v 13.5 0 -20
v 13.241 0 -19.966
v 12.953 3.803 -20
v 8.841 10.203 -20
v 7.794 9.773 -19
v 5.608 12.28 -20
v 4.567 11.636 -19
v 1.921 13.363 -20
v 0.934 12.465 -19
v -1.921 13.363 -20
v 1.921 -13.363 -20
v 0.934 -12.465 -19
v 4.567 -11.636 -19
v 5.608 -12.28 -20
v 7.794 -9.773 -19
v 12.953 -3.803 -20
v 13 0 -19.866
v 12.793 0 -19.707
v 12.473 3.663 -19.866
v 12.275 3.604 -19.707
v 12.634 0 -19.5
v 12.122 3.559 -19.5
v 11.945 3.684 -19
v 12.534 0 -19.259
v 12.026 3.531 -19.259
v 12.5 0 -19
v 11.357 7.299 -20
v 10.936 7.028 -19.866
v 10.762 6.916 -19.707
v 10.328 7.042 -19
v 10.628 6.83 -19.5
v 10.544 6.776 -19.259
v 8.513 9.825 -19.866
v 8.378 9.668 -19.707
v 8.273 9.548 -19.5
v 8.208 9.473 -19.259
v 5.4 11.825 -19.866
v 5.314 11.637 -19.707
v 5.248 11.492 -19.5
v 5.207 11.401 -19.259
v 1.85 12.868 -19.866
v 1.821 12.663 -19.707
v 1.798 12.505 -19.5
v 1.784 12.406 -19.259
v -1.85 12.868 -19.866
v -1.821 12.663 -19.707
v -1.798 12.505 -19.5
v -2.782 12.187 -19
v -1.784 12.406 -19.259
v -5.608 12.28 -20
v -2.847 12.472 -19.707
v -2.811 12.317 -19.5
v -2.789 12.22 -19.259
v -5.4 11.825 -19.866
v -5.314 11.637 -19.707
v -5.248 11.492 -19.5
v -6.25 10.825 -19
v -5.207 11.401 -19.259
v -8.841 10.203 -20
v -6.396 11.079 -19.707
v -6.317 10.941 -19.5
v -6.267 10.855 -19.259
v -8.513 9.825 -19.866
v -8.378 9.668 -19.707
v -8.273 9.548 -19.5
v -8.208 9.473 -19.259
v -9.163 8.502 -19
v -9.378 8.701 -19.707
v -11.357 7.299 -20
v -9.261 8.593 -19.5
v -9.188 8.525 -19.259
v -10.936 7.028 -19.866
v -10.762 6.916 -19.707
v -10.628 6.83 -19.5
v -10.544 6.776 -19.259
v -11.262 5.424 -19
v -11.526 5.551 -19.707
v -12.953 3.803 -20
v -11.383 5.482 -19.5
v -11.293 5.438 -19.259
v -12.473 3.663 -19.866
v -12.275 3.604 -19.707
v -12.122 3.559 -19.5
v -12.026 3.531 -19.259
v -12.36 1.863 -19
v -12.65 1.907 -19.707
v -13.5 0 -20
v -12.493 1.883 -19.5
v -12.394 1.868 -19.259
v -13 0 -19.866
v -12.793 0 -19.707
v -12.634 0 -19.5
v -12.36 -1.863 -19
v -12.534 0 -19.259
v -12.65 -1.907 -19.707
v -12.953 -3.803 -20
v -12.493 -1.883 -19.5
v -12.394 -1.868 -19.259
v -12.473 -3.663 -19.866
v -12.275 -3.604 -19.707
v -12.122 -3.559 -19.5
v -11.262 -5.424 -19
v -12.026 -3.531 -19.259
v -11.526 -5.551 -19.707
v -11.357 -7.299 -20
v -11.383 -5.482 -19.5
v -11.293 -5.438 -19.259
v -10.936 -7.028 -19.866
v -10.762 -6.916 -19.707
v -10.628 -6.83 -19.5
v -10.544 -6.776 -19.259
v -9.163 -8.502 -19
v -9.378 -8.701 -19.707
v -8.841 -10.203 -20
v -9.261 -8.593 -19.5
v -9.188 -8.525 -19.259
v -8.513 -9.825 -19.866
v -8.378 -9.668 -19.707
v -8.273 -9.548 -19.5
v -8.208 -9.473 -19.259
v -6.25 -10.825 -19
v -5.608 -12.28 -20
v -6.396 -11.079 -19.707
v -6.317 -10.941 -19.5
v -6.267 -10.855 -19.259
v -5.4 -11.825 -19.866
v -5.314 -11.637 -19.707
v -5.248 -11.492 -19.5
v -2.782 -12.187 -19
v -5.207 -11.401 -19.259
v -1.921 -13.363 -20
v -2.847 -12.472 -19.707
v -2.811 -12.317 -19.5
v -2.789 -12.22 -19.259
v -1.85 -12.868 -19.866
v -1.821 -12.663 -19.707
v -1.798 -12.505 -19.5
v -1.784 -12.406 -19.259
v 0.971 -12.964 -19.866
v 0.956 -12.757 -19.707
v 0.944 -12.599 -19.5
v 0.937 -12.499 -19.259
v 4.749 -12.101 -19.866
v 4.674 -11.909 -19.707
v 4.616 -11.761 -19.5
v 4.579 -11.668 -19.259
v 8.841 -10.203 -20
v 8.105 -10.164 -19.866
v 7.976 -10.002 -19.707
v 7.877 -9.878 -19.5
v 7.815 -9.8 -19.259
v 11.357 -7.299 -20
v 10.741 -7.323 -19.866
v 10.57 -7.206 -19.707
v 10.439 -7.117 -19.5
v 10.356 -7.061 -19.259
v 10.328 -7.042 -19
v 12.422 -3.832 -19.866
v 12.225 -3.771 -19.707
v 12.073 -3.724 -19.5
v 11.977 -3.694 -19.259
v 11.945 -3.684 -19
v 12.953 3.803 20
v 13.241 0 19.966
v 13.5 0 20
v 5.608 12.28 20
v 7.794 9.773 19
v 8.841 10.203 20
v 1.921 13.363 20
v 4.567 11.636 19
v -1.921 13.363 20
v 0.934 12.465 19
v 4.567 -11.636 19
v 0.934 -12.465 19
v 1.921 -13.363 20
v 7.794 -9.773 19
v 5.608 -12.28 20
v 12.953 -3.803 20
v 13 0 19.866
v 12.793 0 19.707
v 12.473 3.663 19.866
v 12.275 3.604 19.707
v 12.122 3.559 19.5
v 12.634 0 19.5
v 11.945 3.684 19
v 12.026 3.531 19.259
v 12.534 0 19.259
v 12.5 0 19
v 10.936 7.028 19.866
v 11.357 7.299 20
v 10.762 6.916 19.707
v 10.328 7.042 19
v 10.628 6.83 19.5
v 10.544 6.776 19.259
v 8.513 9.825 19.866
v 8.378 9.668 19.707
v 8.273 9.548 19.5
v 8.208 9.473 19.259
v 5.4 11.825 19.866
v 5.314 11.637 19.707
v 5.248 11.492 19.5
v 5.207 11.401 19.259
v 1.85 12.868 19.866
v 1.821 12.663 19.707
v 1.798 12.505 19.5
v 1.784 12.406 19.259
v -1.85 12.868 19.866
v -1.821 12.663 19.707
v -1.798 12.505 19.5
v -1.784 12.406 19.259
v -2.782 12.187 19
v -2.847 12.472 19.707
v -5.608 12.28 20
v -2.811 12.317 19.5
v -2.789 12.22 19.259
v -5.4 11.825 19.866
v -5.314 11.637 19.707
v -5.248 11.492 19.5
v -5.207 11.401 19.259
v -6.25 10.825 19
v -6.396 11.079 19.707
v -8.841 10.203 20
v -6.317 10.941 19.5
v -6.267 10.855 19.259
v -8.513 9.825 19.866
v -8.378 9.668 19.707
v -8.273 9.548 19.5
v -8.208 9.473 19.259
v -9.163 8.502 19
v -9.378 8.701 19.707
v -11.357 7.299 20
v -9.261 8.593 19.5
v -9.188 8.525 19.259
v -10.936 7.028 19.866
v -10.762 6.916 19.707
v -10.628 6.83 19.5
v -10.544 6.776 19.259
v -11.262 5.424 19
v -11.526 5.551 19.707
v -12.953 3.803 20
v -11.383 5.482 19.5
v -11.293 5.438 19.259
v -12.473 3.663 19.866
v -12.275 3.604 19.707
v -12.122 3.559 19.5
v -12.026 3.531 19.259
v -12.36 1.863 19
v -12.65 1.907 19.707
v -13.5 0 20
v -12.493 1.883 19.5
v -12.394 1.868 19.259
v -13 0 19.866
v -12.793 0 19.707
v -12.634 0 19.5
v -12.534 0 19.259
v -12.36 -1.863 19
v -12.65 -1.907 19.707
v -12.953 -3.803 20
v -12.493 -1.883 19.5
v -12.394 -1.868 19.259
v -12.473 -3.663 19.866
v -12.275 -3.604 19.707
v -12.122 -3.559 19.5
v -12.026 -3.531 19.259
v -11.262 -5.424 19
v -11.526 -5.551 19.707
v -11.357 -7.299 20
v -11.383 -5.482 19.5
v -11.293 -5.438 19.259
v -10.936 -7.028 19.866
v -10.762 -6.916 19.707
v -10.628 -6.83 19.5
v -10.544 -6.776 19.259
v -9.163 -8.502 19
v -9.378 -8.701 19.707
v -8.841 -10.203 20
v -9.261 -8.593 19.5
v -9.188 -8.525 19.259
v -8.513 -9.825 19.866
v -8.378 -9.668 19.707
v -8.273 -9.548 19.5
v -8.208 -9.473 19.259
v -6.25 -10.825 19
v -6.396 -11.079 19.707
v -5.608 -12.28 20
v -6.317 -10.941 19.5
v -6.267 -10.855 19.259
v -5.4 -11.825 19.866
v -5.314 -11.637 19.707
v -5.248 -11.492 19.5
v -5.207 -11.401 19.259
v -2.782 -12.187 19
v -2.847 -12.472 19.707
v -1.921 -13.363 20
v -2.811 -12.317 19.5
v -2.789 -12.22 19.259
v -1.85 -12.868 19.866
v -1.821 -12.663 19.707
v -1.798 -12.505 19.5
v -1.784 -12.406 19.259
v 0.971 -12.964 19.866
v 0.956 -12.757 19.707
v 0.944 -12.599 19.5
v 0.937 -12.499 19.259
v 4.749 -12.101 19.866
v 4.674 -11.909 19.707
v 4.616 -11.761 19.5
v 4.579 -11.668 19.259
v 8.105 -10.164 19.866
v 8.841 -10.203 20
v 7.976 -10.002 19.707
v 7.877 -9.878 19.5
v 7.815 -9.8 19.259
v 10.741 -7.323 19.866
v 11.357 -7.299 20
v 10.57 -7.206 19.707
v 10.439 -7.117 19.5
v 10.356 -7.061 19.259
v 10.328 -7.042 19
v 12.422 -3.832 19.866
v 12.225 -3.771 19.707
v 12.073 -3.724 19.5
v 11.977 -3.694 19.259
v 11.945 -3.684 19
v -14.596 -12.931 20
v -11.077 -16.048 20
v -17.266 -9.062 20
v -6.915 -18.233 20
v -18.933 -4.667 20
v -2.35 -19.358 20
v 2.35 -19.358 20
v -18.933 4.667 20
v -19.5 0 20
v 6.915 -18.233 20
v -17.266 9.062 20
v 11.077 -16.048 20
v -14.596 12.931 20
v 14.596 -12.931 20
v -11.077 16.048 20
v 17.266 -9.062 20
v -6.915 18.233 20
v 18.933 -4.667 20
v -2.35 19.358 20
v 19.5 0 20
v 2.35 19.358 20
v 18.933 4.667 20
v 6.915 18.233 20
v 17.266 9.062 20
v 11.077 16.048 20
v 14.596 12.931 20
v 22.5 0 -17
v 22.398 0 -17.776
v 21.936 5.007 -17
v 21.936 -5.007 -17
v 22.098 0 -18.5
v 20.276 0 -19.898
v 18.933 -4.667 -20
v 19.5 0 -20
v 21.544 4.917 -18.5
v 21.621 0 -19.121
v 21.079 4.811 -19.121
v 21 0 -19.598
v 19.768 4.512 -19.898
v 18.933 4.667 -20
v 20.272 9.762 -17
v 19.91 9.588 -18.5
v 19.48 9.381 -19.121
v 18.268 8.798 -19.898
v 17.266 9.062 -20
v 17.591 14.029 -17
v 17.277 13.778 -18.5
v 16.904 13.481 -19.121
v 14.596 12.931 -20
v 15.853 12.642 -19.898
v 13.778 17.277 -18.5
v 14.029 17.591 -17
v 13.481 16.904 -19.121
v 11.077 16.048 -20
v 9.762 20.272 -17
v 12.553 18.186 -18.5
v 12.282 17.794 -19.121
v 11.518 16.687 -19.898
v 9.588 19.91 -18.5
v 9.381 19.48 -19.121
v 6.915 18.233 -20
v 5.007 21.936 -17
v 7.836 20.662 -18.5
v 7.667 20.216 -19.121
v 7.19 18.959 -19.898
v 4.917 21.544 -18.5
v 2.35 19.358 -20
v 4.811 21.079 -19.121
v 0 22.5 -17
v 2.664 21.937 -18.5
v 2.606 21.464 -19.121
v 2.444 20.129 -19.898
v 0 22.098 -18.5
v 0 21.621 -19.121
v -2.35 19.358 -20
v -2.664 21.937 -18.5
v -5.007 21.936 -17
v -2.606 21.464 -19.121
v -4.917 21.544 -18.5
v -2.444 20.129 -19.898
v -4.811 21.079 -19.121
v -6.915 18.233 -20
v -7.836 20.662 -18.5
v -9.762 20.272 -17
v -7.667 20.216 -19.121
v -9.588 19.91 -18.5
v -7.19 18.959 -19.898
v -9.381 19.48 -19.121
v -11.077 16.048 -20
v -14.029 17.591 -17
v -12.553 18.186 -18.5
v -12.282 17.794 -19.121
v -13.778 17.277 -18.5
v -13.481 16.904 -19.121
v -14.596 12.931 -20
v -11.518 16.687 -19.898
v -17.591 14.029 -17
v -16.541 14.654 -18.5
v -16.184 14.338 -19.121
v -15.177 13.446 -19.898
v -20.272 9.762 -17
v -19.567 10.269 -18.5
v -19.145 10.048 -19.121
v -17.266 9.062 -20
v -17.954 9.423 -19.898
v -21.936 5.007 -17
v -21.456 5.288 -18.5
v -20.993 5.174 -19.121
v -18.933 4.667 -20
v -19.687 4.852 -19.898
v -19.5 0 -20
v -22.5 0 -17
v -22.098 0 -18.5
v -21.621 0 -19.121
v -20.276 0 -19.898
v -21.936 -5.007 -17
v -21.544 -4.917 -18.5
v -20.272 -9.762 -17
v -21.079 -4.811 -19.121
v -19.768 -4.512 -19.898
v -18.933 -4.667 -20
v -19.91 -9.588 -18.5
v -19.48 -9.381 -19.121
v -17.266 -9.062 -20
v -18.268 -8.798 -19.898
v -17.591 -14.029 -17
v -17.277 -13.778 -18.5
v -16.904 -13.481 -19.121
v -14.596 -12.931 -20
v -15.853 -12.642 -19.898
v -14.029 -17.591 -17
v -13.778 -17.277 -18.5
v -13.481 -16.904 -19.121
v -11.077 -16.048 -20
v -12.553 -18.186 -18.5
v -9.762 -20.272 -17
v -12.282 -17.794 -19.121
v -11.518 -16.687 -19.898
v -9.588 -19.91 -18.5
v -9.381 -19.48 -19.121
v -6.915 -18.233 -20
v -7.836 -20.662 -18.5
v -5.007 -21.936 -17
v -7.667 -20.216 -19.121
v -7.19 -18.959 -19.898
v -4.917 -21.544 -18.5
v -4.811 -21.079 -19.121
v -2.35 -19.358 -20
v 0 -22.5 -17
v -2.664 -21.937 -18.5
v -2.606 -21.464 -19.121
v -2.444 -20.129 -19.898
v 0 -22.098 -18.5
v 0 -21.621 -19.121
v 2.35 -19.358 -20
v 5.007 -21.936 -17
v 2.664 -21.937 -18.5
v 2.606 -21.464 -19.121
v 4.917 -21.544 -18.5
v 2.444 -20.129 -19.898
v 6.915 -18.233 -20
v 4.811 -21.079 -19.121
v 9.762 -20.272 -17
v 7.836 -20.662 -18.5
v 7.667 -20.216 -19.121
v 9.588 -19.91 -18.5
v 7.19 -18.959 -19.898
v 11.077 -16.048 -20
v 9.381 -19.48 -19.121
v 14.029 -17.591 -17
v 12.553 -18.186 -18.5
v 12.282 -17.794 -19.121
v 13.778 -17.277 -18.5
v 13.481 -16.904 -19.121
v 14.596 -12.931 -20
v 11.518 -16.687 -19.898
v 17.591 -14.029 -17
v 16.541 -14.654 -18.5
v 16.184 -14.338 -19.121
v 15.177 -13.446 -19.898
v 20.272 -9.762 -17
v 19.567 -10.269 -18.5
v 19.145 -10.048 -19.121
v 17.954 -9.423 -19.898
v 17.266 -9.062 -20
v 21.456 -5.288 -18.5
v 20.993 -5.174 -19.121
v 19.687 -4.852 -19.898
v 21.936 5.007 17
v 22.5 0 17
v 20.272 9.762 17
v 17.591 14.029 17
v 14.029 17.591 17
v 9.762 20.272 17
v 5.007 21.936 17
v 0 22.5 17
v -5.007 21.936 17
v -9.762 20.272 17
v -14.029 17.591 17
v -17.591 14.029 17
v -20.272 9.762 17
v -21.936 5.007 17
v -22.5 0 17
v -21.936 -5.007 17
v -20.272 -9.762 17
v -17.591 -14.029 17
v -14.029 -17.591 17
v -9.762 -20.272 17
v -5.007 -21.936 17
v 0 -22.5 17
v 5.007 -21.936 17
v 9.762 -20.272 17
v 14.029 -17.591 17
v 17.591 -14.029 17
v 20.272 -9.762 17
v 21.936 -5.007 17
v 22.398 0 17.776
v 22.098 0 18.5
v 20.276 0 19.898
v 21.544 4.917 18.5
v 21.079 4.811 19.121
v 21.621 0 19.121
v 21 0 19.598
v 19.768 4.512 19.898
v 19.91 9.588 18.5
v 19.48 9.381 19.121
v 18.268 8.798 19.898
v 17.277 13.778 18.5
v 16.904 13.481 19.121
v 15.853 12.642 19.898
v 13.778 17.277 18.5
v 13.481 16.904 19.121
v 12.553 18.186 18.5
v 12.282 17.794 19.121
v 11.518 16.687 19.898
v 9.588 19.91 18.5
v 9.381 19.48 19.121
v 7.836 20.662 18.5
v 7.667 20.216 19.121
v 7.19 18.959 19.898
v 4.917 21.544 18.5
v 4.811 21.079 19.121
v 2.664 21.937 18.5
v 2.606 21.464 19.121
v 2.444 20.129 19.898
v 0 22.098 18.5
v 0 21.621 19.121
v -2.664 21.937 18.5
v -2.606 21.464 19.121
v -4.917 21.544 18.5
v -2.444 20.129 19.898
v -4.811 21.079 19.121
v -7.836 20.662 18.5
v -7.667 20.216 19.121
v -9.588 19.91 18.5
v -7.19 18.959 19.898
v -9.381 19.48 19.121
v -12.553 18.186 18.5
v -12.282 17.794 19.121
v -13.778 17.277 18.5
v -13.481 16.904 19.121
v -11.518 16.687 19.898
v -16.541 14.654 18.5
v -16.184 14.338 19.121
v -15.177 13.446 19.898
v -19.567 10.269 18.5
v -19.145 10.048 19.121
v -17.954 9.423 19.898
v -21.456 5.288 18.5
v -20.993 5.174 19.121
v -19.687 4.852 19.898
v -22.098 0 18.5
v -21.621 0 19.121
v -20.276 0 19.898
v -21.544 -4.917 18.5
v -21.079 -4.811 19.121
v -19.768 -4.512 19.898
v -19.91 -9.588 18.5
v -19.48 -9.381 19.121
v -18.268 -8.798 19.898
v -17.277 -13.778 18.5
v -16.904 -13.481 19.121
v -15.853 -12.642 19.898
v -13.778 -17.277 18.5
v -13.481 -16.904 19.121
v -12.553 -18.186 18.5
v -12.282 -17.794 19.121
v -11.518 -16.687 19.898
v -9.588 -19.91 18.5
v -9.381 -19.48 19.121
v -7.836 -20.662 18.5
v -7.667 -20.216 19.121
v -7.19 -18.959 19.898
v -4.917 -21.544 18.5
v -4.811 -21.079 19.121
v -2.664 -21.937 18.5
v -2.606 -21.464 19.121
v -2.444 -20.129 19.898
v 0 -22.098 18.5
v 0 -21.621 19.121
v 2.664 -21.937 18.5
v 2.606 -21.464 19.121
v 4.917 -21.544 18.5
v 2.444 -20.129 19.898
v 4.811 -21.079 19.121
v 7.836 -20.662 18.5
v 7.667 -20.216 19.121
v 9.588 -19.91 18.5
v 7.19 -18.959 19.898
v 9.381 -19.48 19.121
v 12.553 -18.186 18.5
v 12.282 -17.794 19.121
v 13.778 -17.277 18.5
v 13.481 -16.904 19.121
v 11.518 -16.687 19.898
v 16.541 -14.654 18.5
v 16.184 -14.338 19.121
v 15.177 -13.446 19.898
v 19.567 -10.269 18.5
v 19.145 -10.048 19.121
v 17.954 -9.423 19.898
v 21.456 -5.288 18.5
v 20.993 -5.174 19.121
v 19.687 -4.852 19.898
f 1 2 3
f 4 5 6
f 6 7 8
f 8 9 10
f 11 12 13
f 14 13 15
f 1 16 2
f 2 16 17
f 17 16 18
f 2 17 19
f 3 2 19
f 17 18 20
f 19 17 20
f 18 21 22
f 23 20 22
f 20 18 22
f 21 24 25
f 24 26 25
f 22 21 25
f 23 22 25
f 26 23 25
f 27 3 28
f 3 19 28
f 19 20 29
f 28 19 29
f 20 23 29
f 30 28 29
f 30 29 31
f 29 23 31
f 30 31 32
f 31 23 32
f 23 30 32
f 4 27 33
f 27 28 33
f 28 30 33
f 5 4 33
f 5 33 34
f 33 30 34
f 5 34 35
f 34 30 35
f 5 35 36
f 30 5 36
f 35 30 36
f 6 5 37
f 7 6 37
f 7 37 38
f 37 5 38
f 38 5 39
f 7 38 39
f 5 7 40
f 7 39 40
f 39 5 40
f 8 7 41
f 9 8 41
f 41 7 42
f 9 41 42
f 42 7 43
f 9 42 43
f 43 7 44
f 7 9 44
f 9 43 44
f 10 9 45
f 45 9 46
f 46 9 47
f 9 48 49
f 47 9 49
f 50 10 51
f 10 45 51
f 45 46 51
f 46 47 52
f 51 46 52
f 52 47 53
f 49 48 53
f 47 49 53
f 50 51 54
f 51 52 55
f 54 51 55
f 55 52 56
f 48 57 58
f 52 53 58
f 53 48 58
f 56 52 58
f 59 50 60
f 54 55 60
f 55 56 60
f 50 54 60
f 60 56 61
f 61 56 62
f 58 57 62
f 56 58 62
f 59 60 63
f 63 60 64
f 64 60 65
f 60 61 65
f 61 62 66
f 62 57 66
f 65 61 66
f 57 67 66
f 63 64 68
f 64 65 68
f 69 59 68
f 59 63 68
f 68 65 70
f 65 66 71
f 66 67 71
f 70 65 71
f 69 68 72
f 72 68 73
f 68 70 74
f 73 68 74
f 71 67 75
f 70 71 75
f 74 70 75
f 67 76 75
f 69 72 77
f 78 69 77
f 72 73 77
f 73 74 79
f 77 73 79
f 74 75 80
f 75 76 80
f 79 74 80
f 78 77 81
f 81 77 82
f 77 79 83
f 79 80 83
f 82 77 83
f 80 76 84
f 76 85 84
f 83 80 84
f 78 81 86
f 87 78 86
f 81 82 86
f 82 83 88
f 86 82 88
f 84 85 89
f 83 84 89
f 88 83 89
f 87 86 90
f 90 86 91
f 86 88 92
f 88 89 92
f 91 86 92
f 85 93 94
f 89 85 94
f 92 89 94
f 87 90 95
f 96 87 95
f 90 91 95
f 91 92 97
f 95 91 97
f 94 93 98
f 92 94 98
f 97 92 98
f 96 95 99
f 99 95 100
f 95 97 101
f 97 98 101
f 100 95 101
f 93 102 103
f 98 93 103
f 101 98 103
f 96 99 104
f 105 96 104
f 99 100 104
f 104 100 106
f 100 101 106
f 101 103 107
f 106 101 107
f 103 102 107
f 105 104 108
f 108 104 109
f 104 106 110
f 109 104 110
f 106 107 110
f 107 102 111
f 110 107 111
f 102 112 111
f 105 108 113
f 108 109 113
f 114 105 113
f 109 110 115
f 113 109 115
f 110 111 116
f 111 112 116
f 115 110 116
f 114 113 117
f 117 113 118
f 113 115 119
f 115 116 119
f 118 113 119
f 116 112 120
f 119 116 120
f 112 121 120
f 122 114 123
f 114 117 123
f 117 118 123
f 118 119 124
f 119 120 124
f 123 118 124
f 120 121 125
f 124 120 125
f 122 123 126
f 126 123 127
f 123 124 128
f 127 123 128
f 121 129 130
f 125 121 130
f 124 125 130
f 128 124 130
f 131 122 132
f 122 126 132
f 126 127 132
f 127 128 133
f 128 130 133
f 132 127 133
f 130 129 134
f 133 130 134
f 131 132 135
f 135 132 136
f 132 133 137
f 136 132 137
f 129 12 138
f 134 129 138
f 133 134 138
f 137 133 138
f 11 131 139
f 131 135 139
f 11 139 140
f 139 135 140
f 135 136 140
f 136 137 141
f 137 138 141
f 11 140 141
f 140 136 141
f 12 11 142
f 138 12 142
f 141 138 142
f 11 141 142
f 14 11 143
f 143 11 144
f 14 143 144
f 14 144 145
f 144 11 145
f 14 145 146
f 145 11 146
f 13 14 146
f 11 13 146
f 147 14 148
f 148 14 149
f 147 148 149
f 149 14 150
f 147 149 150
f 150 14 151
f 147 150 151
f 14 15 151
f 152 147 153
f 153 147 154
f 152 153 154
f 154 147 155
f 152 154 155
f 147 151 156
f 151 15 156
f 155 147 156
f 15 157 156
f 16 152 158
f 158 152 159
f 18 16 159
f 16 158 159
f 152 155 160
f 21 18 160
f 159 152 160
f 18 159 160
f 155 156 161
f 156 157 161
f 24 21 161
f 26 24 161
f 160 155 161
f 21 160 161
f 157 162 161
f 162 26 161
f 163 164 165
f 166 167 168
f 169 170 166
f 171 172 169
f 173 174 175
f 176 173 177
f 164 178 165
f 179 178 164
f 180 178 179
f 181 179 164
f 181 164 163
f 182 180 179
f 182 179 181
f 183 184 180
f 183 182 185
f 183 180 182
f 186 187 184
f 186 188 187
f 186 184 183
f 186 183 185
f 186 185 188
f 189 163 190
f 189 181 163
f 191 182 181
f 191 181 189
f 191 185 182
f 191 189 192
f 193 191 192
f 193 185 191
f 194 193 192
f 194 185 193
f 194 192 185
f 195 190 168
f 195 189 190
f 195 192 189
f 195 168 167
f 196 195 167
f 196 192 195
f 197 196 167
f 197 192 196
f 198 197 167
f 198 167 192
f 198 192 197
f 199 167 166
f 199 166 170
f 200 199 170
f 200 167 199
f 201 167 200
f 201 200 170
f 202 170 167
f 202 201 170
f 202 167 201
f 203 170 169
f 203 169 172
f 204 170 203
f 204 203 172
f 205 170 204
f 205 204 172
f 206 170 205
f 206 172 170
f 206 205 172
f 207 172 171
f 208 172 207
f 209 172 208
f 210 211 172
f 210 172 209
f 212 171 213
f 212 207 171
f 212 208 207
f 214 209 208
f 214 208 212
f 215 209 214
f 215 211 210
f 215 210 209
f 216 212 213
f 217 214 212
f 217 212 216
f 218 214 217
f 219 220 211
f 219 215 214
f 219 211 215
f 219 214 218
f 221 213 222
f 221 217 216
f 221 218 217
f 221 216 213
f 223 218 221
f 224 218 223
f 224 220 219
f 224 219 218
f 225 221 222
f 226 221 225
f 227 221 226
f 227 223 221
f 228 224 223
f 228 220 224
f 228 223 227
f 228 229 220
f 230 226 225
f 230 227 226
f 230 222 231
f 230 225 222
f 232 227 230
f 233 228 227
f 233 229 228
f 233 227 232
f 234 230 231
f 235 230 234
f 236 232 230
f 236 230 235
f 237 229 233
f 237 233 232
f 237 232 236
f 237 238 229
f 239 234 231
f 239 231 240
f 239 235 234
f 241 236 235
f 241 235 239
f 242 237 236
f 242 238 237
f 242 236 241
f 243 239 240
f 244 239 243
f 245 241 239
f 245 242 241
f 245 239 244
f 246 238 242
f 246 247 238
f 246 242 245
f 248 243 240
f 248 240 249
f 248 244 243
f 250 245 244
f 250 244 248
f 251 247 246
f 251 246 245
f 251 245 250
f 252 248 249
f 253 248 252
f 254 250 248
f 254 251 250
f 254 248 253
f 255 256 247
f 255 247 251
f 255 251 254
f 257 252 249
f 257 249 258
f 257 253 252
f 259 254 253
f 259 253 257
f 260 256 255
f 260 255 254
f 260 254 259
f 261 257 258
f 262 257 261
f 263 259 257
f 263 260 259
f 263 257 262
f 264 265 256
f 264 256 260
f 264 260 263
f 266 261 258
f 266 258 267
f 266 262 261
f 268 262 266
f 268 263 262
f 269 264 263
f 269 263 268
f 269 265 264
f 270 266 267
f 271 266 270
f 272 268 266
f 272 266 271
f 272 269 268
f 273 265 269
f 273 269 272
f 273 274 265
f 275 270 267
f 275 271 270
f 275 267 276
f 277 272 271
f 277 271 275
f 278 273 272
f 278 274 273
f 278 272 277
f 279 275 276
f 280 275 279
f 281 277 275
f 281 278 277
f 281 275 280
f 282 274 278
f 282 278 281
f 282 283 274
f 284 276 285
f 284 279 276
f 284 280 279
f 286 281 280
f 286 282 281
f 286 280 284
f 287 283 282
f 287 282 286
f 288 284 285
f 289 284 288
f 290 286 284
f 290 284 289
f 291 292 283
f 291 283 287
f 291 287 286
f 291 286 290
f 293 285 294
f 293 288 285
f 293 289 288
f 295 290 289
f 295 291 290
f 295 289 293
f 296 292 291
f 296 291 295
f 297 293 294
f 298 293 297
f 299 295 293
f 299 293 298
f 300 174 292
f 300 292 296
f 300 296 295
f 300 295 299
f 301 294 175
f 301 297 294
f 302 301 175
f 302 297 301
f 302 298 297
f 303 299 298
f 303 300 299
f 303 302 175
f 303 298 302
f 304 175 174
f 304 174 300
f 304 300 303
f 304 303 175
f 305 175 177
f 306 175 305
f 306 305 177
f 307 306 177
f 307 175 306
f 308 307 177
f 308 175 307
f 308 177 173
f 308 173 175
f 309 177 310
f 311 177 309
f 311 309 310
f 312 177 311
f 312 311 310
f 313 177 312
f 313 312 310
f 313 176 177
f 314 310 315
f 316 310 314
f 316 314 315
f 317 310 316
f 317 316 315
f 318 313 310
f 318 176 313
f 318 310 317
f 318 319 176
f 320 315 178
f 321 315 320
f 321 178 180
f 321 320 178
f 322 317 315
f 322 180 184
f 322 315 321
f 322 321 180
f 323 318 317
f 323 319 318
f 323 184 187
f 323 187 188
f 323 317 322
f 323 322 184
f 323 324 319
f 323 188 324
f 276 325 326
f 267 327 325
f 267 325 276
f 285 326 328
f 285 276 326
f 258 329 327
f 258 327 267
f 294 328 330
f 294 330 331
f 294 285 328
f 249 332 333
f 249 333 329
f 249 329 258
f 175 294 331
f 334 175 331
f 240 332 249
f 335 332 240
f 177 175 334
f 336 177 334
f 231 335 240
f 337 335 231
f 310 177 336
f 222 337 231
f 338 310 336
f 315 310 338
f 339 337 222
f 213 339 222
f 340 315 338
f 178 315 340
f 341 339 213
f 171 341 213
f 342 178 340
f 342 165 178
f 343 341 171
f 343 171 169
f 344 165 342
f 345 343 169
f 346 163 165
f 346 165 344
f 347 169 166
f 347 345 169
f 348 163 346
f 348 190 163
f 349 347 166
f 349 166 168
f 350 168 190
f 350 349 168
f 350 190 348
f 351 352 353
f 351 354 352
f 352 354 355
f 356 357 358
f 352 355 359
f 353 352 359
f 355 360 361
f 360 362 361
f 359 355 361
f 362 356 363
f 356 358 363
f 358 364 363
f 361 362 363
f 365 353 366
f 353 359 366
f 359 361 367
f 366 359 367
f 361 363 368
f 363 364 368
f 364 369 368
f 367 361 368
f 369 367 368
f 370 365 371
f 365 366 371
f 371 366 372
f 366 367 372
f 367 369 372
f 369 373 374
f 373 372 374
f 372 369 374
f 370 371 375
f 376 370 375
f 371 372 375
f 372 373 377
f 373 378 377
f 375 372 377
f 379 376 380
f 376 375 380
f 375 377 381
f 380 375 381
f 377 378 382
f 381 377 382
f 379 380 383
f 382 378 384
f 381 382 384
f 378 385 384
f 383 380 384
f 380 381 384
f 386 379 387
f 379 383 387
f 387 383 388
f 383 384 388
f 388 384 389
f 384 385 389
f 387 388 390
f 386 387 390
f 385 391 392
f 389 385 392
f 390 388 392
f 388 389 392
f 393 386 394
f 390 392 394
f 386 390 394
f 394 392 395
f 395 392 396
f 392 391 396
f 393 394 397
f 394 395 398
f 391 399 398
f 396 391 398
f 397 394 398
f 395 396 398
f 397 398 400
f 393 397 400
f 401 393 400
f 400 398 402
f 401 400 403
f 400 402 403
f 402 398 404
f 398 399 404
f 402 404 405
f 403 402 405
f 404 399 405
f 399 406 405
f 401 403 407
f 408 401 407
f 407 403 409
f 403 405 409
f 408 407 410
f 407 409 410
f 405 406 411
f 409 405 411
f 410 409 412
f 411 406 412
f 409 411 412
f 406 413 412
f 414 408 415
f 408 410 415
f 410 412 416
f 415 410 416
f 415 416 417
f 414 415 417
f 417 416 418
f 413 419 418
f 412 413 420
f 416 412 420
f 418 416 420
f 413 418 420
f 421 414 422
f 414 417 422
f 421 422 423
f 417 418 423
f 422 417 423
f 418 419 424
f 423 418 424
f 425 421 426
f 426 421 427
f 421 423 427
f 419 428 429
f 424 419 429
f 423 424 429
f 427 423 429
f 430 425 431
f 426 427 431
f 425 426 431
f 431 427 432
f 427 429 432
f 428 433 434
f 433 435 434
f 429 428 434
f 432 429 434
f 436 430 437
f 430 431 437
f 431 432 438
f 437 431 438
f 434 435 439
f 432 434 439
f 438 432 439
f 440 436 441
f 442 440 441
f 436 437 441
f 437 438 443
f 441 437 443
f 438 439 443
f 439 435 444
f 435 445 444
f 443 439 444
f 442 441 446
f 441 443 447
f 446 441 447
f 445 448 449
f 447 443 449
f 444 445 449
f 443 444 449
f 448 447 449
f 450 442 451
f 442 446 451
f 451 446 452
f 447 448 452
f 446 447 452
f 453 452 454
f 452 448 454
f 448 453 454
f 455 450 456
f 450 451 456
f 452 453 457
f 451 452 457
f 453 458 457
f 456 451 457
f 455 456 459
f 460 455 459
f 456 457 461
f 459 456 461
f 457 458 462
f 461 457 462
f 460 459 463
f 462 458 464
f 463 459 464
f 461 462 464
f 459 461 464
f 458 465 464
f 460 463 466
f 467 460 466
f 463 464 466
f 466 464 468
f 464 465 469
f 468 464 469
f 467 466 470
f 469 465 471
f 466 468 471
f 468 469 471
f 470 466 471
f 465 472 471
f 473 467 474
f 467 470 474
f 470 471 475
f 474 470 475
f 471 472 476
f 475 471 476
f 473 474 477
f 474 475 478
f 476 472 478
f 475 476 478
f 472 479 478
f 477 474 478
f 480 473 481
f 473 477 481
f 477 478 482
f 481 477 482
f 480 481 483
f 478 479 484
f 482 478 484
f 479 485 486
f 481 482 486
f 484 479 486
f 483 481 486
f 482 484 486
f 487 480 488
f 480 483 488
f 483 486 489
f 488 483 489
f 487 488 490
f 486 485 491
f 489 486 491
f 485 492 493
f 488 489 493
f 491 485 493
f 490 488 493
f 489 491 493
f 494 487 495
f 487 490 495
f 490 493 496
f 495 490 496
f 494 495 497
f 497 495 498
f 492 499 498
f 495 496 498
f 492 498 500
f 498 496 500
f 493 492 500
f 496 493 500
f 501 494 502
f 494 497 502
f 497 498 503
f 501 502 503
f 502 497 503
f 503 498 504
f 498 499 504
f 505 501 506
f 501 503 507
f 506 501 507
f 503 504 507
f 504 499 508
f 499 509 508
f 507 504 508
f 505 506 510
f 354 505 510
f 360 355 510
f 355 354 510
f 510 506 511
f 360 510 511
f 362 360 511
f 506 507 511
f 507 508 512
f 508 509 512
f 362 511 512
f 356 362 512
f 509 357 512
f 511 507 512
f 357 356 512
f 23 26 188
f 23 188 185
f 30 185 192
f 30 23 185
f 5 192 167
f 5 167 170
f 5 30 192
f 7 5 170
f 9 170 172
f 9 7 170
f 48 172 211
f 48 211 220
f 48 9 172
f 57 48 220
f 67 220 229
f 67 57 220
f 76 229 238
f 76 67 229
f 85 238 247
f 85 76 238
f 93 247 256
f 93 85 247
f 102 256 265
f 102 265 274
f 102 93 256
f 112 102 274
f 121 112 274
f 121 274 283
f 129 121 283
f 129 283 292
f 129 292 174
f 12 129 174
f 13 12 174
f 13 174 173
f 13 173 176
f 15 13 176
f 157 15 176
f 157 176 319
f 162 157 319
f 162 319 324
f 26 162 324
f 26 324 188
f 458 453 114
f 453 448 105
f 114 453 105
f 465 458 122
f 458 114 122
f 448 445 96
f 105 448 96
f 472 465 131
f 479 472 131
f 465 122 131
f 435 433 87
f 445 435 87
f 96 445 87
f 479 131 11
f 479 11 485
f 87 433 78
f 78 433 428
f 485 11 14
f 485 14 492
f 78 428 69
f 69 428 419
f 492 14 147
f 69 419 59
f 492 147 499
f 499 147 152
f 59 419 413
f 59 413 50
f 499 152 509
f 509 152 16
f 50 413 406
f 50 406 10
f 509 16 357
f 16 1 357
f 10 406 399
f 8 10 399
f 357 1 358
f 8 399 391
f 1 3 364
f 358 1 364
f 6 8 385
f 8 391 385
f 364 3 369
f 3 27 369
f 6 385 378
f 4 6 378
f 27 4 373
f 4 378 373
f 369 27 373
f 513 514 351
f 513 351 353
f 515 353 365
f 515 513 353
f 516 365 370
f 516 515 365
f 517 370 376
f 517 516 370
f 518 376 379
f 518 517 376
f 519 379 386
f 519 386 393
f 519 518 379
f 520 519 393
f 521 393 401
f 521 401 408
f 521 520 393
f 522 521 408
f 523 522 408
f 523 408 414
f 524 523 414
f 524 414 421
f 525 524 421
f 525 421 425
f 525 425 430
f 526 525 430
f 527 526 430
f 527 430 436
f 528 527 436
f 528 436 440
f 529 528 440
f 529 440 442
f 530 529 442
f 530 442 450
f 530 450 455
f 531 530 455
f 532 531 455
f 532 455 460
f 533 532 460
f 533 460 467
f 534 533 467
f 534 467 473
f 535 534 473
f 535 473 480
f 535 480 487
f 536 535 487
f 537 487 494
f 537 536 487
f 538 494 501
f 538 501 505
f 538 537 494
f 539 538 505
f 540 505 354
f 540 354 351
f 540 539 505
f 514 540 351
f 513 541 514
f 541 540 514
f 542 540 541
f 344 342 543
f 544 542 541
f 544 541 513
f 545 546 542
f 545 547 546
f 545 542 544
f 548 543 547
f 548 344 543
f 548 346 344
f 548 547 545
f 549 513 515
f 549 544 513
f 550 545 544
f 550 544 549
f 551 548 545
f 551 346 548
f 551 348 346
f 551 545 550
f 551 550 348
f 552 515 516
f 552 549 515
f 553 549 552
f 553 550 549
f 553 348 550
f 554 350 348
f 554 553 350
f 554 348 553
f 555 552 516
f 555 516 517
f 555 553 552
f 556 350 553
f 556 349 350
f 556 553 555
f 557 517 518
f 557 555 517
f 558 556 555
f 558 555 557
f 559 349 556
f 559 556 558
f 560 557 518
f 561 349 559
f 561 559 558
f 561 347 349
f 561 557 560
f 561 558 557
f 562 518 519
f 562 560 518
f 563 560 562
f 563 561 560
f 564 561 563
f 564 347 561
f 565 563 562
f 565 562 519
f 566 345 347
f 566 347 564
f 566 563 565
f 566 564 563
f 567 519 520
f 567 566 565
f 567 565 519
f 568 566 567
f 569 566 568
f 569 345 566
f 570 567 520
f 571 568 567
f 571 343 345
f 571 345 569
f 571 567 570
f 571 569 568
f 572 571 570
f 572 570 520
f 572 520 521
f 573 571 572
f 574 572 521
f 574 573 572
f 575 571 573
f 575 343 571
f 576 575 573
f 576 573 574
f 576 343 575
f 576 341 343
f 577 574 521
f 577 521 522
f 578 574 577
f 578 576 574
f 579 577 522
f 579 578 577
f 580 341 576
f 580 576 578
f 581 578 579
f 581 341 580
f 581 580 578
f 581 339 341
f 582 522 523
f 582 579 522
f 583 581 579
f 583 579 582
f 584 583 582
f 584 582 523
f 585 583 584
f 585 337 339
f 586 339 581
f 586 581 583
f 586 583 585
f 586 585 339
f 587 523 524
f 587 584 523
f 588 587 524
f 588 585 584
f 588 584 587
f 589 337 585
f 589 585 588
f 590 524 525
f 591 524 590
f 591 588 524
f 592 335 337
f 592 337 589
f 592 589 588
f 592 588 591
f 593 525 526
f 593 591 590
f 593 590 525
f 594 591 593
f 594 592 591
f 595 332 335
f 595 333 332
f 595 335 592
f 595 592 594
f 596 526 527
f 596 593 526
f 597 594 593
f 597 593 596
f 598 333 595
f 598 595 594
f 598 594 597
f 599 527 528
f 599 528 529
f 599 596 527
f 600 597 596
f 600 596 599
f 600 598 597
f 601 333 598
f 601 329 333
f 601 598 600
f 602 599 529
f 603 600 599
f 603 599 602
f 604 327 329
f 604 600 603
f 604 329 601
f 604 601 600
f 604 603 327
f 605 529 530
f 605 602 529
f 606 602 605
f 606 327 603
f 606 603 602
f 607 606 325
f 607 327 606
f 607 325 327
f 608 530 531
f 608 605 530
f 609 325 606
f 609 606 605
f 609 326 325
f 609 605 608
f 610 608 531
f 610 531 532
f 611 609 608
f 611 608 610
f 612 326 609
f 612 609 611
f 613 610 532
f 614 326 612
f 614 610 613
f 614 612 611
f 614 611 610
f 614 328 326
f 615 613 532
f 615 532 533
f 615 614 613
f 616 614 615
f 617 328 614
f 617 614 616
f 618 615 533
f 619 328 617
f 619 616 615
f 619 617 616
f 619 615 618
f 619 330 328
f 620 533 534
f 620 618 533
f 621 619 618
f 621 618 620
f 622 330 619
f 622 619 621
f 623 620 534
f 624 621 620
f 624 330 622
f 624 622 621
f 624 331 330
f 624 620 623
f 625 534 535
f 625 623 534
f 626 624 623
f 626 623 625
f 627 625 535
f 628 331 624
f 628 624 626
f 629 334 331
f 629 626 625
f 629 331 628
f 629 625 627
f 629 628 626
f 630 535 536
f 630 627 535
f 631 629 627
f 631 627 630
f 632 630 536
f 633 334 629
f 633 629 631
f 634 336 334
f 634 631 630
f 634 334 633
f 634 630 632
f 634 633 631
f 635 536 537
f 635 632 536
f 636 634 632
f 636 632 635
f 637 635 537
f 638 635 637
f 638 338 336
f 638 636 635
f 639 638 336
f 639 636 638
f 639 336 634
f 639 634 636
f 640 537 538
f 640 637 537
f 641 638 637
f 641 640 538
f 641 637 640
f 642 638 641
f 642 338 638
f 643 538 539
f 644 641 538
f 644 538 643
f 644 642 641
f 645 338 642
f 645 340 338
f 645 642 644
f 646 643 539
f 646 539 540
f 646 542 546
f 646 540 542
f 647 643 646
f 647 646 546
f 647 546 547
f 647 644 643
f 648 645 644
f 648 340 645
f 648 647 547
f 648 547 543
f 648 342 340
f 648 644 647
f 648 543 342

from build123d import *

# Parameters (mm, degrees)
SKETCH1_R           = 22.5
SKETCH1_R_2         = 12.5
BOSS_EXTRUDE1_DEPTH = 20
FILLET1_R           = 3
FILLET2_R           = 1


with BuildPart() as part:
    # Sketch1 → Boss-Extrude1 (new, symmetric)
    with BuildSketch(Plane.XY):
        Circle(SKETCH1_R)
        Circle(SKETCH1_R_2, mode=Mode.SUBTRACT)
    extrude(amount=BOSS_EXTRUDE1_DEPTH, both=True)

    # Fillet1
    fillet1_edges = [part.edges().sort_by_distance(p)[0] for p in [
        (-22.5, 0, 20),
        (-22.5, 0, -20),
    ]]
    fillet(fillet1_edges, radius=FILLET1_R)

    # Fillet2
    fillet2_edges = [part.edges().sort_by_distance(p)[0] for p in [
        (-12.5, 0, -20),
        (-12.5, 0, 20),
    ]]
    fillet(fillet2_edges, radius=FILLET2_R)


solid = part.part
